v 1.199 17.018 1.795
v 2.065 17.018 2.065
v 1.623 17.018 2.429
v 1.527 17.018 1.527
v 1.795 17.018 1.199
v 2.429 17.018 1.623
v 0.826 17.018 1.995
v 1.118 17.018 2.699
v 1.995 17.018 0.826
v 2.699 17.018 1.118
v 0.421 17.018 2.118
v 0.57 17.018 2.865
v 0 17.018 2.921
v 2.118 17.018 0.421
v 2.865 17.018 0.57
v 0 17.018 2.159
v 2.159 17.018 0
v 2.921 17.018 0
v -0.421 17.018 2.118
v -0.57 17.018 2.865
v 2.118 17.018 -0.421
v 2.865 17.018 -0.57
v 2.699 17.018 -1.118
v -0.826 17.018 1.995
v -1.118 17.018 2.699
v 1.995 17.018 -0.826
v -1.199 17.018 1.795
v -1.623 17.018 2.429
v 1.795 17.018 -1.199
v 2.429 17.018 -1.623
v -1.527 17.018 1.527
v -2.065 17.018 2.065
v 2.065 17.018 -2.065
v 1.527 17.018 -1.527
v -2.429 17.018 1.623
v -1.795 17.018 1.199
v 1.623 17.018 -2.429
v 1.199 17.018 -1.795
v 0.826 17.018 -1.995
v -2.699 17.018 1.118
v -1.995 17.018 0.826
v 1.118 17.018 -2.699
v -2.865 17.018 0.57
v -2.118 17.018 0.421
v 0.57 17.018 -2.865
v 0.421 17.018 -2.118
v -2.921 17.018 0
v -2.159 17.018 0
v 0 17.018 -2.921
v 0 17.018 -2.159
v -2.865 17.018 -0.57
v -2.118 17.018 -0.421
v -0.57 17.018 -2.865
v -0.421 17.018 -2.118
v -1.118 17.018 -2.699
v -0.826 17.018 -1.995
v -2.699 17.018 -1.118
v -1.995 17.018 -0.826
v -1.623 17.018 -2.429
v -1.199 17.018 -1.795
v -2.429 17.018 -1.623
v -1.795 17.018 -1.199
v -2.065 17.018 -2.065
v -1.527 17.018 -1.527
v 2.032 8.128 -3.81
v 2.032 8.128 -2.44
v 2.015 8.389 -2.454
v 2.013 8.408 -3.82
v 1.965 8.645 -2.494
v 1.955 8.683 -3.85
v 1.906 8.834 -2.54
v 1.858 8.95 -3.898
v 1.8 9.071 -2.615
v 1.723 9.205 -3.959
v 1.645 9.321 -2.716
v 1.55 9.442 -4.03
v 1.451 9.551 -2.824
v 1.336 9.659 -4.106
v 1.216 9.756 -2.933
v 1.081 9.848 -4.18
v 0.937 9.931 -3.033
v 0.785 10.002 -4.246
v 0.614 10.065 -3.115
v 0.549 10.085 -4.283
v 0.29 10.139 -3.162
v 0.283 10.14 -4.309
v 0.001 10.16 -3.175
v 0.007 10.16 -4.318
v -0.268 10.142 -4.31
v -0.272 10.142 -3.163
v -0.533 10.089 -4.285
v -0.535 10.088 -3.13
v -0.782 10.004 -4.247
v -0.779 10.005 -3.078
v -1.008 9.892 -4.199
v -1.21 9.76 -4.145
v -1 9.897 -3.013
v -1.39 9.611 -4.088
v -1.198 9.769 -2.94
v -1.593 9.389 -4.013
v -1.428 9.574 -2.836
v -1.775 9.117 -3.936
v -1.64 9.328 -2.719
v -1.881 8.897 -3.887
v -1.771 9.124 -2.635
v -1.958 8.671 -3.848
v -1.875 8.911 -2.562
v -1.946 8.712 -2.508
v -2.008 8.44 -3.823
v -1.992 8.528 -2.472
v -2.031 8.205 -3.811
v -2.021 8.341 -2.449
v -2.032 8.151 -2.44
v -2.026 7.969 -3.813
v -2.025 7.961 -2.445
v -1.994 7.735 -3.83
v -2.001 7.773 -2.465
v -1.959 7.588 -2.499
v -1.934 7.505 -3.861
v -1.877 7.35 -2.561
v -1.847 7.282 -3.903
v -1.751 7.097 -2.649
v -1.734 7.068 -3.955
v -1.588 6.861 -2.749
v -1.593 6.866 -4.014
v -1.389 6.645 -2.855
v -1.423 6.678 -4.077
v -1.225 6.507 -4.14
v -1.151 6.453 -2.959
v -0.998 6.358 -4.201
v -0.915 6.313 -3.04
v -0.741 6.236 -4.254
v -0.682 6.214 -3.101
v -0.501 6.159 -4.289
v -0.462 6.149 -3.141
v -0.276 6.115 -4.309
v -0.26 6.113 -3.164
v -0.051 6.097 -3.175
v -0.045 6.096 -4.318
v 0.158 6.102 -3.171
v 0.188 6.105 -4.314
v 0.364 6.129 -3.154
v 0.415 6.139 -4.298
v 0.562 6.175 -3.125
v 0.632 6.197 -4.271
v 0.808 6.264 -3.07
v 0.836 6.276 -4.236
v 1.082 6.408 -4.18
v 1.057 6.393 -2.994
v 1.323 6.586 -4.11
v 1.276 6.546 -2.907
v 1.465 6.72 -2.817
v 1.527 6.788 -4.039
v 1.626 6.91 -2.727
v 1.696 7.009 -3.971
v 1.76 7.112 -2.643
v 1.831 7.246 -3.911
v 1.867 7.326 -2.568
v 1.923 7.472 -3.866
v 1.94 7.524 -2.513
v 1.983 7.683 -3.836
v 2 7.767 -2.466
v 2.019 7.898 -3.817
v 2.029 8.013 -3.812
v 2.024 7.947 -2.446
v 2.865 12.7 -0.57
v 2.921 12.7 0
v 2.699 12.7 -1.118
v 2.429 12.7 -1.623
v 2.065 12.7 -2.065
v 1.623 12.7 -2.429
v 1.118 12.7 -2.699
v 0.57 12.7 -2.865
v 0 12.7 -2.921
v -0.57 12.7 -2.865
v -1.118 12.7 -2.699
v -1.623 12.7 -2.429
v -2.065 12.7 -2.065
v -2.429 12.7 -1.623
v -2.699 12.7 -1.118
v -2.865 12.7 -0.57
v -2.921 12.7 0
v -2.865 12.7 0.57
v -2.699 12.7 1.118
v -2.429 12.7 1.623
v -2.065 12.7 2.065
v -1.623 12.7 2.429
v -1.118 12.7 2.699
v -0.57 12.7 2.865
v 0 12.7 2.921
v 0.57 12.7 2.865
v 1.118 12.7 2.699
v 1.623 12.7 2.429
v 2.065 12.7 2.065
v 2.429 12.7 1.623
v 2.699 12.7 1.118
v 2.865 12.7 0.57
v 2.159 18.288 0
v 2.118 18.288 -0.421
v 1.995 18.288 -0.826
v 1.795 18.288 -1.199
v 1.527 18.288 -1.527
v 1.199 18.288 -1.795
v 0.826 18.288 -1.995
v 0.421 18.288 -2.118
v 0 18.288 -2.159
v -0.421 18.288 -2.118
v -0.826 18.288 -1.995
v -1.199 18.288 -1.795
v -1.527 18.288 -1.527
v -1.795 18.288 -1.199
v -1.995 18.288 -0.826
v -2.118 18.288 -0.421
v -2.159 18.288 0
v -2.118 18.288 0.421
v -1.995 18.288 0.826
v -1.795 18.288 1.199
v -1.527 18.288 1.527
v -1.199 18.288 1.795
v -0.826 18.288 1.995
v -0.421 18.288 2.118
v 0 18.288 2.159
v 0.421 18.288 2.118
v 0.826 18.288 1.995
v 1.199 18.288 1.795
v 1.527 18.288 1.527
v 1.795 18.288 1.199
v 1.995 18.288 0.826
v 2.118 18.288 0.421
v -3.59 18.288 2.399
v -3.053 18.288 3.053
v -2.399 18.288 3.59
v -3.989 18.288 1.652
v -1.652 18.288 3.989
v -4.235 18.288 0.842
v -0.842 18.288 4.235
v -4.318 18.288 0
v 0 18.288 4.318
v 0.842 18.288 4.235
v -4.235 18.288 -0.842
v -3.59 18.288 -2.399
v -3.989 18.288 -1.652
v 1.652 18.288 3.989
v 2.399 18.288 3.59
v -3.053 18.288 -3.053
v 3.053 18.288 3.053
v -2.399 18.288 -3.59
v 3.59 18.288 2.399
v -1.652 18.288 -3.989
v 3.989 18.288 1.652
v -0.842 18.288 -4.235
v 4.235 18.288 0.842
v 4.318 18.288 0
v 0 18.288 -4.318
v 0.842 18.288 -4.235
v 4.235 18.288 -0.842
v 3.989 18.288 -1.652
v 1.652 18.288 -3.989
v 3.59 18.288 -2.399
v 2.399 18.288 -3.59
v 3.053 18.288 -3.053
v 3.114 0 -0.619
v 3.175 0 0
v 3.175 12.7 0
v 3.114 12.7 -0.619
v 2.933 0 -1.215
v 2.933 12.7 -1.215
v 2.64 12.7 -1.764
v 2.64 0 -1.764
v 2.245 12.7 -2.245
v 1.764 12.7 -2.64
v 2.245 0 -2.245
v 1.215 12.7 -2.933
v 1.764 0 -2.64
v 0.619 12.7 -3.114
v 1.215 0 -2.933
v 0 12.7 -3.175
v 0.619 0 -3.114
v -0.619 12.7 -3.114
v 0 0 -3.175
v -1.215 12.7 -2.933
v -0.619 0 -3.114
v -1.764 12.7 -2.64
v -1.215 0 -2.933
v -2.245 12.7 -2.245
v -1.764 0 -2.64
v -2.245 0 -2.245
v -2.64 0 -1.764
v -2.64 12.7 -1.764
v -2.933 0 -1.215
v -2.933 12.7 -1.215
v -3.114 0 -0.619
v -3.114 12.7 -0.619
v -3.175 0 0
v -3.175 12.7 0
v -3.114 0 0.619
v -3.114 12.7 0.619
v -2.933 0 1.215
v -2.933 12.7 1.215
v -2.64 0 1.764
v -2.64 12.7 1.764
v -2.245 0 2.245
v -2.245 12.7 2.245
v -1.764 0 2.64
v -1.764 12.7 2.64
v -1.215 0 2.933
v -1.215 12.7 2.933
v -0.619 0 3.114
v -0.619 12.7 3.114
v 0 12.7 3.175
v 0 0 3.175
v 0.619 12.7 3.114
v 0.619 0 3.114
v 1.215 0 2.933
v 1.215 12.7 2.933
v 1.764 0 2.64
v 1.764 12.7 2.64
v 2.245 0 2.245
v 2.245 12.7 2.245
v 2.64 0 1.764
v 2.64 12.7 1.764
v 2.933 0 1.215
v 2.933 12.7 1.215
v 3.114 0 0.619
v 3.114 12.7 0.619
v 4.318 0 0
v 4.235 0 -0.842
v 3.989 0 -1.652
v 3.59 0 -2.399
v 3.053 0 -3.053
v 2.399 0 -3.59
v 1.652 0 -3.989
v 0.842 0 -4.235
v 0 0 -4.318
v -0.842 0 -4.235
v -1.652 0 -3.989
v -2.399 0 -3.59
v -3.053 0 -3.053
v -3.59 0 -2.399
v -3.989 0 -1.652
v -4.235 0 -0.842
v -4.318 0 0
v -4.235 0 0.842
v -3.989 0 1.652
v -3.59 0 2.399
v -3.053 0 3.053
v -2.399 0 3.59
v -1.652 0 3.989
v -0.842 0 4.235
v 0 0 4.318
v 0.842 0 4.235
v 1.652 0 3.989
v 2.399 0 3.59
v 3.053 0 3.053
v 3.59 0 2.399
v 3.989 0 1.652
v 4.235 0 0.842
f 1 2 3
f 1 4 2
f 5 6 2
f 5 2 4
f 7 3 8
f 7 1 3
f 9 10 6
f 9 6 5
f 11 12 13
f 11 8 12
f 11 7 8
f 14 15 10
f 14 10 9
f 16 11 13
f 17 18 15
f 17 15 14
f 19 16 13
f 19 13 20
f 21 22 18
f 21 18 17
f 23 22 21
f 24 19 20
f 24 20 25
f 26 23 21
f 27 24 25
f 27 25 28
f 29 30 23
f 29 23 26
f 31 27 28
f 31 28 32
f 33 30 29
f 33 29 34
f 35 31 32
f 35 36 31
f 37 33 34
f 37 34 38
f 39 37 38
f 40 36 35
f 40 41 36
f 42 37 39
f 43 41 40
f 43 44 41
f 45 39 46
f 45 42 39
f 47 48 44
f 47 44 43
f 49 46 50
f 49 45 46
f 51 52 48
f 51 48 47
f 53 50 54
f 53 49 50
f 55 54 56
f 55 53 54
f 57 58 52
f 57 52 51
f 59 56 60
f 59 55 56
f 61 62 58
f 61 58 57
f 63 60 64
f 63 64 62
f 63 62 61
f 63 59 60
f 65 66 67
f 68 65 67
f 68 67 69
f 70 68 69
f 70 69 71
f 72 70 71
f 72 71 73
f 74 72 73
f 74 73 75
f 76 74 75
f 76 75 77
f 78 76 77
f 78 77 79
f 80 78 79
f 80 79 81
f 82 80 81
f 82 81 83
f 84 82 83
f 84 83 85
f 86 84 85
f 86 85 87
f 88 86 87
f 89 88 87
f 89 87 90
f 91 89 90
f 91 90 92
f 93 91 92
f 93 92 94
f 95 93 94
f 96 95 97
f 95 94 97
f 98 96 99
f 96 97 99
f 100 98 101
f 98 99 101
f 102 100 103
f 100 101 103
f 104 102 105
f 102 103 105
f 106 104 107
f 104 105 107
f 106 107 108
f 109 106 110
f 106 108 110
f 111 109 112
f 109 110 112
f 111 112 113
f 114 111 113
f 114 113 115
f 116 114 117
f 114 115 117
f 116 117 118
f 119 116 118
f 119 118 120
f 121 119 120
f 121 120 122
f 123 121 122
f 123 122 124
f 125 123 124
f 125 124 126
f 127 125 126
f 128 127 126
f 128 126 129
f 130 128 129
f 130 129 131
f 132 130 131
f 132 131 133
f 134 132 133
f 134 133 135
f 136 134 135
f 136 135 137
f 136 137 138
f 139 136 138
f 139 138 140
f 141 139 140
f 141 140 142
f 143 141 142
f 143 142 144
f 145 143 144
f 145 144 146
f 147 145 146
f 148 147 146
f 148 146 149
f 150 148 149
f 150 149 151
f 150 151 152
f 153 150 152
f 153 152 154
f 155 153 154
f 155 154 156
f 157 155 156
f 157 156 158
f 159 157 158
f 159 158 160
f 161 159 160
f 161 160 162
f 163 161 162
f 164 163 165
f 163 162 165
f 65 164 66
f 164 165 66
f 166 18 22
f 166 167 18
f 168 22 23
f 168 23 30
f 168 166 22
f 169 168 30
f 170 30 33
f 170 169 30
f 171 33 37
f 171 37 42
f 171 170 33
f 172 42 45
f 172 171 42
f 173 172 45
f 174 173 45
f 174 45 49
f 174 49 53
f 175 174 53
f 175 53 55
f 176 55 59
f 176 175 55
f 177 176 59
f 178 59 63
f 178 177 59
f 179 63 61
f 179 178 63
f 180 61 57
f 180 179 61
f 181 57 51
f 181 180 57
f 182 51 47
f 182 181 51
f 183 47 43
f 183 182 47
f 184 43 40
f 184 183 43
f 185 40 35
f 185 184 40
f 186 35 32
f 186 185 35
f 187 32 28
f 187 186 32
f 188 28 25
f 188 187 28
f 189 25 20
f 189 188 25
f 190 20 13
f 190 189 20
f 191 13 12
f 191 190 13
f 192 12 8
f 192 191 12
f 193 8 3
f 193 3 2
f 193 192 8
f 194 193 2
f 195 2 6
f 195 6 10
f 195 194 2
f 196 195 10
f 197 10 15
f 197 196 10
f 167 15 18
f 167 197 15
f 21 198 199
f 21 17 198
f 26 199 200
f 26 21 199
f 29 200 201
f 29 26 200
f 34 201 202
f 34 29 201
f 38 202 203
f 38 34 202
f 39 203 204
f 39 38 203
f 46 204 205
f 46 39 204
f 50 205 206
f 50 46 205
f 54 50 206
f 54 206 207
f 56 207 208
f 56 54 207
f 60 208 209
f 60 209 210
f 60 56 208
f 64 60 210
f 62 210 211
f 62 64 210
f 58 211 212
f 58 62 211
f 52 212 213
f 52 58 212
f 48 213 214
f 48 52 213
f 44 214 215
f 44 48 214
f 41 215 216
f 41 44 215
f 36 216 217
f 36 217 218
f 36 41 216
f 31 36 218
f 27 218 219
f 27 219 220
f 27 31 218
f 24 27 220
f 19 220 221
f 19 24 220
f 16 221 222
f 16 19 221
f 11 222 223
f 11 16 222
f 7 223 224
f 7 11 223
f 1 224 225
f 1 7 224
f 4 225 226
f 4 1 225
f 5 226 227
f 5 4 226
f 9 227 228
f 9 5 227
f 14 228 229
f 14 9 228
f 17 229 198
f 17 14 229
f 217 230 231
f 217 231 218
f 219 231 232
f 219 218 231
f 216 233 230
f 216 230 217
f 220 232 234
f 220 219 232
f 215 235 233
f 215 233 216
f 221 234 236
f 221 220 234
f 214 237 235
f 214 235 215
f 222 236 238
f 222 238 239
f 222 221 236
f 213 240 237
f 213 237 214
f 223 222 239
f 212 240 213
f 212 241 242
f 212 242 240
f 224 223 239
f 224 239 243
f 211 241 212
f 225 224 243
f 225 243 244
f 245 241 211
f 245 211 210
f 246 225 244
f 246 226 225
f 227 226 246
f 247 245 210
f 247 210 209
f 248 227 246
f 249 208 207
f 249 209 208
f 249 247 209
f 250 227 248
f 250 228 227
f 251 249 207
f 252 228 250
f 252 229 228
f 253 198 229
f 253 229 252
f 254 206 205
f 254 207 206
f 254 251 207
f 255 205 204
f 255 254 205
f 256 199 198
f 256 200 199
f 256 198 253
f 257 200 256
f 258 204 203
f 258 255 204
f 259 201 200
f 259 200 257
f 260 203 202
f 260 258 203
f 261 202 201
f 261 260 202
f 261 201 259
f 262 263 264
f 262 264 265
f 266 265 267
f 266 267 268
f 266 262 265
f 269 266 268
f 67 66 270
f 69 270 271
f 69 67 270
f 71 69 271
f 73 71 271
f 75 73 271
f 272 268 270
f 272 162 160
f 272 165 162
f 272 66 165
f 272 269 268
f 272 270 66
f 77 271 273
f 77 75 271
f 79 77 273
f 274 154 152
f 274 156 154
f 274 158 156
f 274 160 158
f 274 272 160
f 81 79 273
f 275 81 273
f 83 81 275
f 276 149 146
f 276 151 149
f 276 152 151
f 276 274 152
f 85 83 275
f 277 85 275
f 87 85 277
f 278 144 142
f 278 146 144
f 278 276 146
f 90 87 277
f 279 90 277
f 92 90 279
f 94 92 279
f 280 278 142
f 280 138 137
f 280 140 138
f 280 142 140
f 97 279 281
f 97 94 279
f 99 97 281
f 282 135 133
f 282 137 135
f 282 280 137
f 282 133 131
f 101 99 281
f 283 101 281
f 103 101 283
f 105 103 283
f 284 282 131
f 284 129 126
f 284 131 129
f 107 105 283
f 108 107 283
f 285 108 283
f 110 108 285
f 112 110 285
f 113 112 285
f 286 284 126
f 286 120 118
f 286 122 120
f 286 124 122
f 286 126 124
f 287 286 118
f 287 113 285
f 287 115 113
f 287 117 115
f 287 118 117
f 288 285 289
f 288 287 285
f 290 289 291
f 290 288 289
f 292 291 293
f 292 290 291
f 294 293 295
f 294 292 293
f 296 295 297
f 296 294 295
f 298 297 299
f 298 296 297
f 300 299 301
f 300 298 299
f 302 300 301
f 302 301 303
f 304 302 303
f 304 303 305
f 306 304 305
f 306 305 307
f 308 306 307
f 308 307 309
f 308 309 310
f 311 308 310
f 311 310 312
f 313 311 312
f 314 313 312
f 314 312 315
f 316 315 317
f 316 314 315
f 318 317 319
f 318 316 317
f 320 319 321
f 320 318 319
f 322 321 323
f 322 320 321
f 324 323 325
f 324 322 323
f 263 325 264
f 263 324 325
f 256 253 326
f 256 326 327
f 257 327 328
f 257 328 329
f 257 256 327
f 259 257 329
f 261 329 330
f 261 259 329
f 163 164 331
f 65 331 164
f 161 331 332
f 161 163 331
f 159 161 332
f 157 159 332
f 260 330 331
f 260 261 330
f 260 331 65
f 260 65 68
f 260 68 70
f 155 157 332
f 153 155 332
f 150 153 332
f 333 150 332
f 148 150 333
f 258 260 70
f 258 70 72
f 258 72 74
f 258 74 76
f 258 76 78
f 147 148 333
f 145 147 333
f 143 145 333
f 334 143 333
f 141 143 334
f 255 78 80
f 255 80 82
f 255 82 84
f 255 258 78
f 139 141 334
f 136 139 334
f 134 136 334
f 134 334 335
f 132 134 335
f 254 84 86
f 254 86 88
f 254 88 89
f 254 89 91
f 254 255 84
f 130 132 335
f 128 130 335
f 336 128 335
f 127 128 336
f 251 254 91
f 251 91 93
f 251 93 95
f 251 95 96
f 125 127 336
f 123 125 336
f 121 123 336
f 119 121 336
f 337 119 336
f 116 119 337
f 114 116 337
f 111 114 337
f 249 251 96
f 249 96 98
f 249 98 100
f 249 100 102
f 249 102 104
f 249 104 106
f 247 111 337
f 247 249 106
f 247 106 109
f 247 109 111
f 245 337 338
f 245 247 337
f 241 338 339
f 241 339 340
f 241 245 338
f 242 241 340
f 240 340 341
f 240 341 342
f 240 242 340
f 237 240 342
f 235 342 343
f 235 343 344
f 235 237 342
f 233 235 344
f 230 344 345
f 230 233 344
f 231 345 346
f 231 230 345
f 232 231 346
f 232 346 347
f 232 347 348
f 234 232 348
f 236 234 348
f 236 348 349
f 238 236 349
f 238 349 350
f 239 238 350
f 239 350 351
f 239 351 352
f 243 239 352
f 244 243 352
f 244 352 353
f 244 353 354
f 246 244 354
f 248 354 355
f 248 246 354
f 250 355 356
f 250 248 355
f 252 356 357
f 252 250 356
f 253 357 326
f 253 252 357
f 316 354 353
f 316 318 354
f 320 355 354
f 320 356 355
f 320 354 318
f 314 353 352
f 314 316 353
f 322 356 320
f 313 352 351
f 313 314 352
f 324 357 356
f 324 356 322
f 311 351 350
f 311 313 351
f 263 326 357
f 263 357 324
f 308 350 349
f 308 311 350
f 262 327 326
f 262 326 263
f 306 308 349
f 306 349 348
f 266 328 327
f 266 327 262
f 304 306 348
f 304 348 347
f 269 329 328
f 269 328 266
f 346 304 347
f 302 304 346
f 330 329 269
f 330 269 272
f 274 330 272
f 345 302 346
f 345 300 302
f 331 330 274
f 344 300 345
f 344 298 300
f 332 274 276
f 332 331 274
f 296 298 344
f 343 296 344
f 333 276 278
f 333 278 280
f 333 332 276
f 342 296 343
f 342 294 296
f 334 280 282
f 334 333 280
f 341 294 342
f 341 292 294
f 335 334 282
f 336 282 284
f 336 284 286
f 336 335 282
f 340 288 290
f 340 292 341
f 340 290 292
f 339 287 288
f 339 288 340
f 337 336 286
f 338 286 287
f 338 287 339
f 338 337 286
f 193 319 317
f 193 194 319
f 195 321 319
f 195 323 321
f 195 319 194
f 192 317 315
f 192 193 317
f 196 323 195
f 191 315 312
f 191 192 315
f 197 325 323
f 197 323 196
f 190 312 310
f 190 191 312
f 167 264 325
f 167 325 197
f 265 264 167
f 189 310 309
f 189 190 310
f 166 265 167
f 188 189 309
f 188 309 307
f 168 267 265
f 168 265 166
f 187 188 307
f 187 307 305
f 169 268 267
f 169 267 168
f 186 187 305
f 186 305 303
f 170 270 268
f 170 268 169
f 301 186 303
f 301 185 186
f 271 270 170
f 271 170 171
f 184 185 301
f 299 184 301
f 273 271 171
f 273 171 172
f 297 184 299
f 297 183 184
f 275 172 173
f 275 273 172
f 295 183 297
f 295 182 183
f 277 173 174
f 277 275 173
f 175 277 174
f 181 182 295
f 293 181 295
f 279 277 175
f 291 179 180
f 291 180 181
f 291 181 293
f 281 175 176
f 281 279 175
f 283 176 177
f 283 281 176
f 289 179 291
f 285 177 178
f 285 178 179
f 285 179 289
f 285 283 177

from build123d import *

# Parameters (mm, degrees)
SKETCH3_R          = 2.032
CUT_EXTRUDE1_DEPTH = 5.318


with BuildPart() as part:
    # Sketch2 → Revolve1 (revolve)
    with BuildSketch(Plane.XY):
        Polygon((3.175, 0), (4.318, 0), (4.318, 18.288), (2.159, 18.288), (2.159, 17.018), (2.921, 17.018), (2.921, 12.7), (3.175, 12.7), align=None)
    revolve(axis=Axis((0, 0, 0), (0, 1, 0)))

    # Sketch3 → Cut-Extrude1 (cut, through all)
    with BuildSketch(Plane.XY):
        with Locations((0, 8.128)):
            Circle(SKETCH3_R)
    extrude(amount=-CUT_EXTRUDE1_DEPTH, mode=Mode.SUBTRACT)


solid = part.part
